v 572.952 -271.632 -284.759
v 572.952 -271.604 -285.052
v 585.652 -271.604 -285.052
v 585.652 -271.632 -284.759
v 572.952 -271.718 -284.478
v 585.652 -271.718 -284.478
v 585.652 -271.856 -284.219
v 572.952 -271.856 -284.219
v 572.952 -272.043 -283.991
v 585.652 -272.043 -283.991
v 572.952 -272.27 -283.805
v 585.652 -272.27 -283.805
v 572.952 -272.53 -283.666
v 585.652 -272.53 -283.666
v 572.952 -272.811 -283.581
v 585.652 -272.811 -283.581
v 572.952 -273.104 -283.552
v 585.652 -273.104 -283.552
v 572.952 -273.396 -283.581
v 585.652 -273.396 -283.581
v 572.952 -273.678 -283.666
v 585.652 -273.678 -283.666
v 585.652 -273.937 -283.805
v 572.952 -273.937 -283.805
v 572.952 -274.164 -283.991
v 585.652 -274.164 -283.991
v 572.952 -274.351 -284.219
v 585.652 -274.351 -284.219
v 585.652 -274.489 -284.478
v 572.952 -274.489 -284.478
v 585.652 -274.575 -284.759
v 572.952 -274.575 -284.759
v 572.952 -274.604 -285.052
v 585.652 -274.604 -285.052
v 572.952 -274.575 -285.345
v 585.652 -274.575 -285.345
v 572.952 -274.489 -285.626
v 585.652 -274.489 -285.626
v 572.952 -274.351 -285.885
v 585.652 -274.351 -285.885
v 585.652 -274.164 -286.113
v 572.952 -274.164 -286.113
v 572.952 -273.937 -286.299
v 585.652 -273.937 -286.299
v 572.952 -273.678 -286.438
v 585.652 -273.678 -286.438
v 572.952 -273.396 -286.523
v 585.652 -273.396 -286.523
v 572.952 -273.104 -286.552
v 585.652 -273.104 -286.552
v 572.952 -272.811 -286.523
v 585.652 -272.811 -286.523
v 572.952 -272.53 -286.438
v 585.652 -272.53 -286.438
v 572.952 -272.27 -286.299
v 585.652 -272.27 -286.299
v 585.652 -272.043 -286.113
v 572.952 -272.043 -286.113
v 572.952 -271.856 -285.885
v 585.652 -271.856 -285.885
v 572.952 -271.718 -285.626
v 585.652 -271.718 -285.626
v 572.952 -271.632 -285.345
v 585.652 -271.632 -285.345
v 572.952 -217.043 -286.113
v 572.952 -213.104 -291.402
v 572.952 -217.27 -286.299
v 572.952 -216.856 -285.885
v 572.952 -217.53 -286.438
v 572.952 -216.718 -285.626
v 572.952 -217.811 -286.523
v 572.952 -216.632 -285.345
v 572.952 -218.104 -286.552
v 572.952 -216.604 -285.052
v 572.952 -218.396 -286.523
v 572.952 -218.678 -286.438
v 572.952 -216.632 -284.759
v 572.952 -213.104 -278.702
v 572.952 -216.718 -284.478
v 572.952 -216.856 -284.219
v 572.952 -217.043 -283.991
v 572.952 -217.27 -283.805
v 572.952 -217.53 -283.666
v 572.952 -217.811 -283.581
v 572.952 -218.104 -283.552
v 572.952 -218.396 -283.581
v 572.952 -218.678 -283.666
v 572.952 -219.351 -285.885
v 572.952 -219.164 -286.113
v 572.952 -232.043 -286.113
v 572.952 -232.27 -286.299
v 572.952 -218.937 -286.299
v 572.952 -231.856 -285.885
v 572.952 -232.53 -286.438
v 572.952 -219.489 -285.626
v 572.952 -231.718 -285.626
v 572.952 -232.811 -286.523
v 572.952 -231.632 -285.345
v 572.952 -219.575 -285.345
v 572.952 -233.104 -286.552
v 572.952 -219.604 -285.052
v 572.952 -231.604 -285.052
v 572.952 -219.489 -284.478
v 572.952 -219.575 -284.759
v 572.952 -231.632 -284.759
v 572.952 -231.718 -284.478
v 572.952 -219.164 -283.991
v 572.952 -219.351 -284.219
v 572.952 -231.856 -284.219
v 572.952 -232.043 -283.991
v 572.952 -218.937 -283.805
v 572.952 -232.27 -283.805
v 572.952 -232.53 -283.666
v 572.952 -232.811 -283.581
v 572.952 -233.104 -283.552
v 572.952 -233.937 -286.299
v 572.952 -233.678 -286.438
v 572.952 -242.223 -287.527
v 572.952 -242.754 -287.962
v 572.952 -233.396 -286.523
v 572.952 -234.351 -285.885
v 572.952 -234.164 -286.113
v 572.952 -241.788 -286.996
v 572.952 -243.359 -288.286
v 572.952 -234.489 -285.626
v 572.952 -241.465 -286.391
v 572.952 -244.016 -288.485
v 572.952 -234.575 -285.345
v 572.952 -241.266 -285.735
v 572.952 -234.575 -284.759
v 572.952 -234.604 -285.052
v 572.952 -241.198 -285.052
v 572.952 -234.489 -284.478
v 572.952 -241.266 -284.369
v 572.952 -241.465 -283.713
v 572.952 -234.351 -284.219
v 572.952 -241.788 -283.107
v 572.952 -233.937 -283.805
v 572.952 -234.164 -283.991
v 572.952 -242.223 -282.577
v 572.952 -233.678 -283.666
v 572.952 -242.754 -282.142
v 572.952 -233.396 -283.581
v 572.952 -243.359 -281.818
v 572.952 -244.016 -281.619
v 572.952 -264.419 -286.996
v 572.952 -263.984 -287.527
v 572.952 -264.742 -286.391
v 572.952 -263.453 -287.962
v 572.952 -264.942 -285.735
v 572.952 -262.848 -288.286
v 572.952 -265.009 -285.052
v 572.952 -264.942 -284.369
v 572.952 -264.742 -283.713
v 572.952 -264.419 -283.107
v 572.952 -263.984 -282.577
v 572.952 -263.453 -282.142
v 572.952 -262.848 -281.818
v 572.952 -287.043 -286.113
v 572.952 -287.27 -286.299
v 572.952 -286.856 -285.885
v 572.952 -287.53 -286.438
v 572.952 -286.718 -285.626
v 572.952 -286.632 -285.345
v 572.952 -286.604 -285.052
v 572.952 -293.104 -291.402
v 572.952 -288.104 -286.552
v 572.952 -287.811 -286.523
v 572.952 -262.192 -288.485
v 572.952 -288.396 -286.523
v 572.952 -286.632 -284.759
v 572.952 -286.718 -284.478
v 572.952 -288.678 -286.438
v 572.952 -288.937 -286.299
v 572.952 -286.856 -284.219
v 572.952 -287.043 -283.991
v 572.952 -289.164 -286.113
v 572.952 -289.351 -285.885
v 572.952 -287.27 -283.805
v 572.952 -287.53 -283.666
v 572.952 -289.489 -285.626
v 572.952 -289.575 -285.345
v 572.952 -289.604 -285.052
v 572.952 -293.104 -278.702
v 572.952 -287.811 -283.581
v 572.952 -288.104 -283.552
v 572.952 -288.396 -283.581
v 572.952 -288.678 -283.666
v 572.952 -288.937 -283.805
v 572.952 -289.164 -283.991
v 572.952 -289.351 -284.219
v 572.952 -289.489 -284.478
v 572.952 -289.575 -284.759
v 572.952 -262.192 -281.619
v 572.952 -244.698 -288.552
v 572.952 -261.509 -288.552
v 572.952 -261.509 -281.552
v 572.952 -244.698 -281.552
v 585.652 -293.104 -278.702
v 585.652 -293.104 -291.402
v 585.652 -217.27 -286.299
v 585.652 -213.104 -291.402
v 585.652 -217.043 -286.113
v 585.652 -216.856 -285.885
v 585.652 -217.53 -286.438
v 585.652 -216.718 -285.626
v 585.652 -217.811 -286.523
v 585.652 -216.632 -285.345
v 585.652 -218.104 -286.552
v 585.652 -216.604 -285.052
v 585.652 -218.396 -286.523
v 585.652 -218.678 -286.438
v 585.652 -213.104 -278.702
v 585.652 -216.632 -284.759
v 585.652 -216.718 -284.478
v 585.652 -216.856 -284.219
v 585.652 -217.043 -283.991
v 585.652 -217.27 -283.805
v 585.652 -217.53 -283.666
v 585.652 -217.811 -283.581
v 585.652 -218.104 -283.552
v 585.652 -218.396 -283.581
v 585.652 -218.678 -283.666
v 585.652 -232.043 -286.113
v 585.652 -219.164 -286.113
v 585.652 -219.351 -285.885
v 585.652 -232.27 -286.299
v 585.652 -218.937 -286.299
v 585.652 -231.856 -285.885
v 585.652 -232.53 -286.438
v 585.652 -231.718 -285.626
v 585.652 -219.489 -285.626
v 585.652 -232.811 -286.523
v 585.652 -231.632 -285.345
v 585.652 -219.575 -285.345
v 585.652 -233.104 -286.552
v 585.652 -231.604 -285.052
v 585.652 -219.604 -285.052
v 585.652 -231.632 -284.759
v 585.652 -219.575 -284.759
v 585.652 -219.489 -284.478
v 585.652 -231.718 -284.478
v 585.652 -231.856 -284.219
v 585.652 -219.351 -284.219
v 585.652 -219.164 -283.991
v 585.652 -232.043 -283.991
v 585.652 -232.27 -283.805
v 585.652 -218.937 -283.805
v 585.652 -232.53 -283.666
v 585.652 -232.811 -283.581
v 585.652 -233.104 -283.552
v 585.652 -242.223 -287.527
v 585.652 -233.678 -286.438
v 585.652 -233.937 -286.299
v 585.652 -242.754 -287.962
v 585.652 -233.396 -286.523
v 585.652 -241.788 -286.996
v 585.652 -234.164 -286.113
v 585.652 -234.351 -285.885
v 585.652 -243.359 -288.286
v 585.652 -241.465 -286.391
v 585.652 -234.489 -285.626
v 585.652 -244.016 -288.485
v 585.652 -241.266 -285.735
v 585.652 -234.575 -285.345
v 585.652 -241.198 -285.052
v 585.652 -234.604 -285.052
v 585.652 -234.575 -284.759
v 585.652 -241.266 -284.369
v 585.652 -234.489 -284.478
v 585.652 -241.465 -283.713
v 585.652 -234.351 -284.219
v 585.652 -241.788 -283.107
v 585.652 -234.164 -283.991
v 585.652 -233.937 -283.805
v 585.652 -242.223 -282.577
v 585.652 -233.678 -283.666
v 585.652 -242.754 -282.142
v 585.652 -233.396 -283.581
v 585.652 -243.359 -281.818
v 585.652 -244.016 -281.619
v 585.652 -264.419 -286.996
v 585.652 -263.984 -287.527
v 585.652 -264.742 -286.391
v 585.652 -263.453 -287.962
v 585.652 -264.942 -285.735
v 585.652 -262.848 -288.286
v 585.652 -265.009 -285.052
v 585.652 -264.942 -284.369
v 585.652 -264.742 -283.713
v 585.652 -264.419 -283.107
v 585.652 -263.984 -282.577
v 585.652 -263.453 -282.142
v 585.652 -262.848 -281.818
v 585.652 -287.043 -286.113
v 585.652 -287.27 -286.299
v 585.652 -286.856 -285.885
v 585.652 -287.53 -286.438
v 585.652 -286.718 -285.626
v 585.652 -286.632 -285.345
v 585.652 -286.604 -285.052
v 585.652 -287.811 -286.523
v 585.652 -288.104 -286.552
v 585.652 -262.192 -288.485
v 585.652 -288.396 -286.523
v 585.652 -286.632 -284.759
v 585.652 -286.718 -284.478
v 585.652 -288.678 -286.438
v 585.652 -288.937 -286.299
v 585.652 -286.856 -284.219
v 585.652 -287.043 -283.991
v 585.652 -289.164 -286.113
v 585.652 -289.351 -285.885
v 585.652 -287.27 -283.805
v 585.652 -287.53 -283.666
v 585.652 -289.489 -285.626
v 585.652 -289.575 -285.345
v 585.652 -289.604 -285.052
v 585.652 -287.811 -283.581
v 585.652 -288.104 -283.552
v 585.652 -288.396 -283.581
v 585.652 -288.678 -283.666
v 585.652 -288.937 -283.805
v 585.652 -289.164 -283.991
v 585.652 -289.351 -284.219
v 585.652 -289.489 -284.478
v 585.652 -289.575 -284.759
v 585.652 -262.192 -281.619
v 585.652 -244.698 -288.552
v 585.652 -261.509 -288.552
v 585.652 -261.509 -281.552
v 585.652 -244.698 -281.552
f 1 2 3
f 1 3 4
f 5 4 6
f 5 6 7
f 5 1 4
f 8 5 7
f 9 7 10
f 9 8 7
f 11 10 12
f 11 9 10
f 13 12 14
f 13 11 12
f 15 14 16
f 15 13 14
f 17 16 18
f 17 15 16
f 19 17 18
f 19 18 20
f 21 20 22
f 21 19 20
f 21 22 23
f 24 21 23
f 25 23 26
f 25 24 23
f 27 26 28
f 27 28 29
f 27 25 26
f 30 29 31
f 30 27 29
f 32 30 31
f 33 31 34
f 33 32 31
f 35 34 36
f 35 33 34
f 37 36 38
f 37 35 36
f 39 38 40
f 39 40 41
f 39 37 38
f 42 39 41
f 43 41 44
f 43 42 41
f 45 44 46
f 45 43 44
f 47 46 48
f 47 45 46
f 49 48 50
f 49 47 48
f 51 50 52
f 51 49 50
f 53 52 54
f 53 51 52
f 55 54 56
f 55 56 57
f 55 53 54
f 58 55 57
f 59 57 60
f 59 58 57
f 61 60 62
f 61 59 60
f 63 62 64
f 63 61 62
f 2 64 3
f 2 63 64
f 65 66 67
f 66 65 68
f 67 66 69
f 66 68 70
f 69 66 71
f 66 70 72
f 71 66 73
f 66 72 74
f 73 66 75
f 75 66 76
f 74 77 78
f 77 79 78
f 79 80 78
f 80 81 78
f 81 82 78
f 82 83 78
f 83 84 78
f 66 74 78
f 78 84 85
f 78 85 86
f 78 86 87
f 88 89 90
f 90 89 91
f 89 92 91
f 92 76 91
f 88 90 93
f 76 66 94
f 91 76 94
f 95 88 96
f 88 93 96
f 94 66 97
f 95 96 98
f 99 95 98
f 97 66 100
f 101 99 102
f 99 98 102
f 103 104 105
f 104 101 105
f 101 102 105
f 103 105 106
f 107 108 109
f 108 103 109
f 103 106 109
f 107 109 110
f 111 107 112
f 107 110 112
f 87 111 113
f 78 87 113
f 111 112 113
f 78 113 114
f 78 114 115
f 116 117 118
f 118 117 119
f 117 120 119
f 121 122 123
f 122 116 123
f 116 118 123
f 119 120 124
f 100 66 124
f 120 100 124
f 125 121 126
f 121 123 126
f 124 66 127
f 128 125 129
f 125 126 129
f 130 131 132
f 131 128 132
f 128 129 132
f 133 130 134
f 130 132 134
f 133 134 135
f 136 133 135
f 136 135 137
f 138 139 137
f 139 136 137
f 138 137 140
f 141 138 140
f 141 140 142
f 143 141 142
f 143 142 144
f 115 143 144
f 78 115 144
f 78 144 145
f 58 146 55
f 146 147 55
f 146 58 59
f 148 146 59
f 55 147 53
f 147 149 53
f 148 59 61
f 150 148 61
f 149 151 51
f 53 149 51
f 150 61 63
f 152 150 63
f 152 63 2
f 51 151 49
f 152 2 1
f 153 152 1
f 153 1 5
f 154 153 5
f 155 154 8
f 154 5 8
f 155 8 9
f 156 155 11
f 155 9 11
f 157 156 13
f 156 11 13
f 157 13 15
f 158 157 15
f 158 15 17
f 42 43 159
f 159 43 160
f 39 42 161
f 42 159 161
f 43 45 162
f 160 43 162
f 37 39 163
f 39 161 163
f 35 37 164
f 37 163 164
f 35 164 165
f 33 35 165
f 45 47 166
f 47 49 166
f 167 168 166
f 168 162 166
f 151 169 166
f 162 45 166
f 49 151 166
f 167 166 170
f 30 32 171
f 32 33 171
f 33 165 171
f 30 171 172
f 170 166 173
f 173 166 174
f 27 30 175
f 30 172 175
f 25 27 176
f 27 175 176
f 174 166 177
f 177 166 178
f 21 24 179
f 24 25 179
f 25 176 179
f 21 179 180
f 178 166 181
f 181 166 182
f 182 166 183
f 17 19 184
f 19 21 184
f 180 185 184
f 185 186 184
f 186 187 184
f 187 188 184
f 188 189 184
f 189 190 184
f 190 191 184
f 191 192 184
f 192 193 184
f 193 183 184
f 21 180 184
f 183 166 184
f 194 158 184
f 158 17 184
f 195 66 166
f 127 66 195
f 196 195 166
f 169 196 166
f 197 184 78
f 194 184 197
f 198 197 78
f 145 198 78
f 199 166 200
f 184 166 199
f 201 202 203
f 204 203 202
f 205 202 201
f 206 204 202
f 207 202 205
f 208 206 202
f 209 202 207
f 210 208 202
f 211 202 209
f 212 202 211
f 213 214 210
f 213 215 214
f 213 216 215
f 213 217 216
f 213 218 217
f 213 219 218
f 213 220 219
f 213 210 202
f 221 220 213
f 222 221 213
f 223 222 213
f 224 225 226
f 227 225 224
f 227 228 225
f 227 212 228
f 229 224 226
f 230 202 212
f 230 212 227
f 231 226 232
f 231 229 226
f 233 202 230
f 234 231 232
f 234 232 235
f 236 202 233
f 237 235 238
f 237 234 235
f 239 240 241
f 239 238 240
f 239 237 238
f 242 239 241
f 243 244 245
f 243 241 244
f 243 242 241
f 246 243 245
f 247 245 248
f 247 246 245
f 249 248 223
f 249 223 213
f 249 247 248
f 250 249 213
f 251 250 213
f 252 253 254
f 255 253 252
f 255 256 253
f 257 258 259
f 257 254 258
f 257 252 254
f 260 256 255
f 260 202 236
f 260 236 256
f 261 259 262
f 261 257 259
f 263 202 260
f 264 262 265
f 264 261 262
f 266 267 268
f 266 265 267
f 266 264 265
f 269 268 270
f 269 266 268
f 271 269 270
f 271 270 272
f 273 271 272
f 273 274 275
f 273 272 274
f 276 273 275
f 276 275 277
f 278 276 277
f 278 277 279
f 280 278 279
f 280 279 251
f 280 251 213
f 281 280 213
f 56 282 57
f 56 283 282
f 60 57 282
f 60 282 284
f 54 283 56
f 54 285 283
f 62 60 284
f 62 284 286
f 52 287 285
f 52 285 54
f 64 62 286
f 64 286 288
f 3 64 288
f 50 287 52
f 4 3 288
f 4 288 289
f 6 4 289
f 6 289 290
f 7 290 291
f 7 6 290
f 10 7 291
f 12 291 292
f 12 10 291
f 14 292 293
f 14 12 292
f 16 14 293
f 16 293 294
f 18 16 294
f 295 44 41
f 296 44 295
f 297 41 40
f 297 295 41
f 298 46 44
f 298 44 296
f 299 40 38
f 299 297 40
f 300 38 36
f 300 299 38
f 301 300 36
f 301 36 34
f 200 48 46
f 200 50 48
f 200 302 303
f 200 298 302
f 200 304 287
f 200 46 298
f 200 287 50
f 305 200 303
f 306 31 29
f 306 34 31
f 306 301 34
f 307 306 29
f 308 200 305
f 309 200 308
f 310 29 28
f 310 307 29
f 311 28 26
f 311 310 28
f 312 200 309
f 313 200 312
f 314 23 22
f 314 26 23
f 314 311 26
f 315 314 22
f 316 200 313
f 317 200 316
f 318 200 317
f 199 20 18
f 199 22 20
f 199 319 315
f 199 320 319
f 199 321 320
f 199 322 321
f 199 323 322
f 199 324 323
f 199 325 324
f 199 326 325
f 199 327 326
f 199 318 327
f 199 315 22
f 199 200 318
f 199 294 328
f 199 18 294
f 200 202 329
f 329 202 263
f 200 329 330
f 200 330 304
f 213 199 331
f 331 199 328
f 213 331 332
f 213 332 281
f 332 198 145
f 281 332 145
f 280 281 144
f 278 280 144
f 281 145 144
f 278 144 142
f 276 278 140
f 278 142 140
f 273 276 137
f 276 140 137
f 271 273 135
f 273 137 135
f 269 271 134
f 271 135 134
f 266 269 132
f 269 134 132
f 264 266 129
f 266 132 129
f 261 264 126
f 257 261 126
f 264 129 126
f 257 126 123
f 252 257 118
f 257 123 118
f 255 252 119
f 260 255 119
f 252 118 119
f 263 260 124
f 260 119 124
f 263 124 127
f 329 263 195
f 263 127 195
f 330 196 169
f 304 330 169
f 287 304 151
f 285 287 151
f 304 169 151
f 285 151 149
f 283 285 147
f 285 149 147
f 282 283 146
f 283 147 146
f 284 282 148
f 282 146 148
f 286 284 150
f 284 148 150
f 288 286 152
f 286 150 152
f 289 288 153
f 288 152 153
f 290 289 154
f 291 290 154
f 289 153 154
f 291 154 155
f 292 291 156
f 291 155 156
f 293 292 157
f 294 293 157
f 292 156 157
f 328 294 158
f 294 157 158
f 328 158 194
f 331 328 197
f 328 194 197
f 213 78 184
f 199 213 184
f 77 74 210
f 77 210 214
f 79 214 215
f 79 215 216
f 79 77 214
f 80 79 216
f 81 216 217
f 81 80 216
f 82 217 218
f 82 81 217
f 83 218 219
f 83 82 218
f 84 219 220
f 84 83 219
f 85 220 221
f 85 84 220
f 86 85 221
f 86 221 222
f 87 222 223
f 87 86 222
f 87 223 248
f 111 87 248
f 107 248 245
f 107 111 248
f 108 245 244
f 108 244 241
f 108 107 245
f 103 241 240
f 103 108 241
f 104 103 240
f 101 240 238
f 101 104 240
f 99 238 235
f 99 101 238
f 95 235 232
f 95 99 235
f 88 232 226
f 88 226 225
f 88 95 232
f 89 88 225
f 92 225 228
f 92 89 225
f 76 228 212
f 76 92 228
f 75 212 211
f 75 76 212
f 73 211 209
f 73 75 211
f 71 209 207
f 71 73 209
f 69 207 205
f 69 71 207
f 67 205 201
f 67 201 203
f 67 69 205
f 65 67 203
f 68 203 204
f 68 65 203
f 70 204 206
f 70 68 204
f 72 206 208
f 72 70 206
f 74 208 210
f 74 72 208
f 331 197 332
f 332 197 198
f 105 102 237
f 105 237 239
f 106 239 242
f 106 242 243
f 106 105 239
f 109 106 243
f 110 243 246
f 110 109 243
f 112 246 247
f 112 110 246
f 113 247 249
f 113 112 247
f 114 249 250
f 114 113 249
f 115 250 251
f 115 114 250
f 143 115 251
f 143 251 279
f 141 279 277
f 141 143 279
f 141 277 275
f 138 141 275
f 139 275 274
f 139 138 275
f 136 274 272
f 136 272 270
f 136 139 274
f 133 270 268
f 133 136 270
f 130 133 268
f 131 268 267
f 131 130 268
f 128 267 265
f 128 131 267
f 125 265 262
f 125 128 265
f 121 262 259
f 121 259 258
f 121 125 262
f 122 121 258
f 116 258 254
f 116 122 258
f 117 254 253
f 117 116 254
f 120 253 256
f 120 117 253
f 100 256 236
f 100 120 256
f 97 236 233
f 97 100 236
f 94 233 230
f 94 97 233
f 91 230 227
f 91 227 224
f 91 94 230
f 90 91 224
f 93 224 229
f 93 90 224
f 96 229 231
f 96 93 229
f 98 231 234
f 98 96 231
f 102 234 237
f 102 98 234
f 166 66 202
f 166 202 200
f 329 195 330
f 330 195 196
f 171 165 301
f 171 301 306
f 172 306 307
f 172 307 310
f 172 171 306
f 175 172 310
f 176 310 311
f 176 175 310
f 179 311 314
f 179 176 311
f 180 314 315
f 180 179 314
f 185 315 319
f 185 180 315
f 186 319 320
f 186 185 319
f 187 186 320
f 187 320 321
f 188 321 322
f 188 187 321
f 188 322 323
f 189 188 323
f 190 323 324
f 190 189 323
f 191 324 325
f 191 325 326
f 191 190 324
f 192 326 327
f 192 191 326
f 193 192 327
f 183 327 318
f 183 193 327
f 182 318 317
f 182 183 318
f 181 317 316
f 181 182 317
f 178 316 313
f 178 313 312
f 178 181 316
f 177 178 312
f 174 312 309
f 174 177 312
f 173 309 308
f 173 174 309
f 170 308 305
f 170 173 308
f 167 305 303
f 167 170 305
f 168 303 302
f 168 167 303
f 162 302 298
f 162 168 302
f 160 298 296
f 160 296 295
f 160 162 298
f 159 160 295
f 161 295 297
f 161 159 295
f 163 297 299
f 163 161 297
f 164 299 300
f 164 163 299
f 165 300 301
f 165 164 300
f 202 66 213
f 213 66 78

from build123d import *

# Parameters (mm, degrees)
SKETCH1_W           = 12.7
SKETCH1_H           = 80
SKETCH1_R           = 1.5
BOSS_EXTRUDE1_DEPTH = 12.7


with BuildPart() as part:
    # Sketch1 → Boss-Extrude1 (new body)
    with BuildSketch(Plane(origin=(572.952355873, -103.733491168, -119.473981867), x_dir=(0, 0, 1), z_dir=(1, 0, 0))):
        with Locations((-165.577945174, 149.370143232)):
            Rectangle(SKETCH1_W, SKETCH1_H)
        with Locations(Location((-165.577945174, 169.370143232, 0), (0, 0, 270))):
            Circle(SKETCH1_R, mode=Mode.SUBTRACT)
        with Locations(Location((-165.577945174, 184.370143232, 0), (0, 0, 270))):
            Circle(SKETCH1_R, mode=Mode.SUBTRACT)
        with Locations(Location((-165.577945174, 114.370143232, 0), (0, 0, 270))):
            Circle(SKETCH1_R, mode=Mode.SUBTRACT)
        with Locations(Location((-165.577945174, 129.370143232, 0), (0, 0, 270))):
            Circle(SKETCH1_R, mode=Mode.SUBTRACT)
        with BuildLine():
            Line((-162.077945174, 157.77541555), (-162.077945174, 140.964870914))
            ThreePointArc((-162.077945174, 140.964870914), (-165.577945174, 137.464870914), (-169.077945174, 140.964870914))
            Line((-169.077945174, 140.964870914), (-169.077945174, 157.77541555))
            ThreePointArc((-169.077945174, 157.77541555), (-165.577945174, 161.27541555), (-162.077945174, 157.77541555))
        make_face(mode=Mode.SUBTRACT)
    extrude(amount=BOSS_EXTRUDE1_DEPTH)


solid = part.part
